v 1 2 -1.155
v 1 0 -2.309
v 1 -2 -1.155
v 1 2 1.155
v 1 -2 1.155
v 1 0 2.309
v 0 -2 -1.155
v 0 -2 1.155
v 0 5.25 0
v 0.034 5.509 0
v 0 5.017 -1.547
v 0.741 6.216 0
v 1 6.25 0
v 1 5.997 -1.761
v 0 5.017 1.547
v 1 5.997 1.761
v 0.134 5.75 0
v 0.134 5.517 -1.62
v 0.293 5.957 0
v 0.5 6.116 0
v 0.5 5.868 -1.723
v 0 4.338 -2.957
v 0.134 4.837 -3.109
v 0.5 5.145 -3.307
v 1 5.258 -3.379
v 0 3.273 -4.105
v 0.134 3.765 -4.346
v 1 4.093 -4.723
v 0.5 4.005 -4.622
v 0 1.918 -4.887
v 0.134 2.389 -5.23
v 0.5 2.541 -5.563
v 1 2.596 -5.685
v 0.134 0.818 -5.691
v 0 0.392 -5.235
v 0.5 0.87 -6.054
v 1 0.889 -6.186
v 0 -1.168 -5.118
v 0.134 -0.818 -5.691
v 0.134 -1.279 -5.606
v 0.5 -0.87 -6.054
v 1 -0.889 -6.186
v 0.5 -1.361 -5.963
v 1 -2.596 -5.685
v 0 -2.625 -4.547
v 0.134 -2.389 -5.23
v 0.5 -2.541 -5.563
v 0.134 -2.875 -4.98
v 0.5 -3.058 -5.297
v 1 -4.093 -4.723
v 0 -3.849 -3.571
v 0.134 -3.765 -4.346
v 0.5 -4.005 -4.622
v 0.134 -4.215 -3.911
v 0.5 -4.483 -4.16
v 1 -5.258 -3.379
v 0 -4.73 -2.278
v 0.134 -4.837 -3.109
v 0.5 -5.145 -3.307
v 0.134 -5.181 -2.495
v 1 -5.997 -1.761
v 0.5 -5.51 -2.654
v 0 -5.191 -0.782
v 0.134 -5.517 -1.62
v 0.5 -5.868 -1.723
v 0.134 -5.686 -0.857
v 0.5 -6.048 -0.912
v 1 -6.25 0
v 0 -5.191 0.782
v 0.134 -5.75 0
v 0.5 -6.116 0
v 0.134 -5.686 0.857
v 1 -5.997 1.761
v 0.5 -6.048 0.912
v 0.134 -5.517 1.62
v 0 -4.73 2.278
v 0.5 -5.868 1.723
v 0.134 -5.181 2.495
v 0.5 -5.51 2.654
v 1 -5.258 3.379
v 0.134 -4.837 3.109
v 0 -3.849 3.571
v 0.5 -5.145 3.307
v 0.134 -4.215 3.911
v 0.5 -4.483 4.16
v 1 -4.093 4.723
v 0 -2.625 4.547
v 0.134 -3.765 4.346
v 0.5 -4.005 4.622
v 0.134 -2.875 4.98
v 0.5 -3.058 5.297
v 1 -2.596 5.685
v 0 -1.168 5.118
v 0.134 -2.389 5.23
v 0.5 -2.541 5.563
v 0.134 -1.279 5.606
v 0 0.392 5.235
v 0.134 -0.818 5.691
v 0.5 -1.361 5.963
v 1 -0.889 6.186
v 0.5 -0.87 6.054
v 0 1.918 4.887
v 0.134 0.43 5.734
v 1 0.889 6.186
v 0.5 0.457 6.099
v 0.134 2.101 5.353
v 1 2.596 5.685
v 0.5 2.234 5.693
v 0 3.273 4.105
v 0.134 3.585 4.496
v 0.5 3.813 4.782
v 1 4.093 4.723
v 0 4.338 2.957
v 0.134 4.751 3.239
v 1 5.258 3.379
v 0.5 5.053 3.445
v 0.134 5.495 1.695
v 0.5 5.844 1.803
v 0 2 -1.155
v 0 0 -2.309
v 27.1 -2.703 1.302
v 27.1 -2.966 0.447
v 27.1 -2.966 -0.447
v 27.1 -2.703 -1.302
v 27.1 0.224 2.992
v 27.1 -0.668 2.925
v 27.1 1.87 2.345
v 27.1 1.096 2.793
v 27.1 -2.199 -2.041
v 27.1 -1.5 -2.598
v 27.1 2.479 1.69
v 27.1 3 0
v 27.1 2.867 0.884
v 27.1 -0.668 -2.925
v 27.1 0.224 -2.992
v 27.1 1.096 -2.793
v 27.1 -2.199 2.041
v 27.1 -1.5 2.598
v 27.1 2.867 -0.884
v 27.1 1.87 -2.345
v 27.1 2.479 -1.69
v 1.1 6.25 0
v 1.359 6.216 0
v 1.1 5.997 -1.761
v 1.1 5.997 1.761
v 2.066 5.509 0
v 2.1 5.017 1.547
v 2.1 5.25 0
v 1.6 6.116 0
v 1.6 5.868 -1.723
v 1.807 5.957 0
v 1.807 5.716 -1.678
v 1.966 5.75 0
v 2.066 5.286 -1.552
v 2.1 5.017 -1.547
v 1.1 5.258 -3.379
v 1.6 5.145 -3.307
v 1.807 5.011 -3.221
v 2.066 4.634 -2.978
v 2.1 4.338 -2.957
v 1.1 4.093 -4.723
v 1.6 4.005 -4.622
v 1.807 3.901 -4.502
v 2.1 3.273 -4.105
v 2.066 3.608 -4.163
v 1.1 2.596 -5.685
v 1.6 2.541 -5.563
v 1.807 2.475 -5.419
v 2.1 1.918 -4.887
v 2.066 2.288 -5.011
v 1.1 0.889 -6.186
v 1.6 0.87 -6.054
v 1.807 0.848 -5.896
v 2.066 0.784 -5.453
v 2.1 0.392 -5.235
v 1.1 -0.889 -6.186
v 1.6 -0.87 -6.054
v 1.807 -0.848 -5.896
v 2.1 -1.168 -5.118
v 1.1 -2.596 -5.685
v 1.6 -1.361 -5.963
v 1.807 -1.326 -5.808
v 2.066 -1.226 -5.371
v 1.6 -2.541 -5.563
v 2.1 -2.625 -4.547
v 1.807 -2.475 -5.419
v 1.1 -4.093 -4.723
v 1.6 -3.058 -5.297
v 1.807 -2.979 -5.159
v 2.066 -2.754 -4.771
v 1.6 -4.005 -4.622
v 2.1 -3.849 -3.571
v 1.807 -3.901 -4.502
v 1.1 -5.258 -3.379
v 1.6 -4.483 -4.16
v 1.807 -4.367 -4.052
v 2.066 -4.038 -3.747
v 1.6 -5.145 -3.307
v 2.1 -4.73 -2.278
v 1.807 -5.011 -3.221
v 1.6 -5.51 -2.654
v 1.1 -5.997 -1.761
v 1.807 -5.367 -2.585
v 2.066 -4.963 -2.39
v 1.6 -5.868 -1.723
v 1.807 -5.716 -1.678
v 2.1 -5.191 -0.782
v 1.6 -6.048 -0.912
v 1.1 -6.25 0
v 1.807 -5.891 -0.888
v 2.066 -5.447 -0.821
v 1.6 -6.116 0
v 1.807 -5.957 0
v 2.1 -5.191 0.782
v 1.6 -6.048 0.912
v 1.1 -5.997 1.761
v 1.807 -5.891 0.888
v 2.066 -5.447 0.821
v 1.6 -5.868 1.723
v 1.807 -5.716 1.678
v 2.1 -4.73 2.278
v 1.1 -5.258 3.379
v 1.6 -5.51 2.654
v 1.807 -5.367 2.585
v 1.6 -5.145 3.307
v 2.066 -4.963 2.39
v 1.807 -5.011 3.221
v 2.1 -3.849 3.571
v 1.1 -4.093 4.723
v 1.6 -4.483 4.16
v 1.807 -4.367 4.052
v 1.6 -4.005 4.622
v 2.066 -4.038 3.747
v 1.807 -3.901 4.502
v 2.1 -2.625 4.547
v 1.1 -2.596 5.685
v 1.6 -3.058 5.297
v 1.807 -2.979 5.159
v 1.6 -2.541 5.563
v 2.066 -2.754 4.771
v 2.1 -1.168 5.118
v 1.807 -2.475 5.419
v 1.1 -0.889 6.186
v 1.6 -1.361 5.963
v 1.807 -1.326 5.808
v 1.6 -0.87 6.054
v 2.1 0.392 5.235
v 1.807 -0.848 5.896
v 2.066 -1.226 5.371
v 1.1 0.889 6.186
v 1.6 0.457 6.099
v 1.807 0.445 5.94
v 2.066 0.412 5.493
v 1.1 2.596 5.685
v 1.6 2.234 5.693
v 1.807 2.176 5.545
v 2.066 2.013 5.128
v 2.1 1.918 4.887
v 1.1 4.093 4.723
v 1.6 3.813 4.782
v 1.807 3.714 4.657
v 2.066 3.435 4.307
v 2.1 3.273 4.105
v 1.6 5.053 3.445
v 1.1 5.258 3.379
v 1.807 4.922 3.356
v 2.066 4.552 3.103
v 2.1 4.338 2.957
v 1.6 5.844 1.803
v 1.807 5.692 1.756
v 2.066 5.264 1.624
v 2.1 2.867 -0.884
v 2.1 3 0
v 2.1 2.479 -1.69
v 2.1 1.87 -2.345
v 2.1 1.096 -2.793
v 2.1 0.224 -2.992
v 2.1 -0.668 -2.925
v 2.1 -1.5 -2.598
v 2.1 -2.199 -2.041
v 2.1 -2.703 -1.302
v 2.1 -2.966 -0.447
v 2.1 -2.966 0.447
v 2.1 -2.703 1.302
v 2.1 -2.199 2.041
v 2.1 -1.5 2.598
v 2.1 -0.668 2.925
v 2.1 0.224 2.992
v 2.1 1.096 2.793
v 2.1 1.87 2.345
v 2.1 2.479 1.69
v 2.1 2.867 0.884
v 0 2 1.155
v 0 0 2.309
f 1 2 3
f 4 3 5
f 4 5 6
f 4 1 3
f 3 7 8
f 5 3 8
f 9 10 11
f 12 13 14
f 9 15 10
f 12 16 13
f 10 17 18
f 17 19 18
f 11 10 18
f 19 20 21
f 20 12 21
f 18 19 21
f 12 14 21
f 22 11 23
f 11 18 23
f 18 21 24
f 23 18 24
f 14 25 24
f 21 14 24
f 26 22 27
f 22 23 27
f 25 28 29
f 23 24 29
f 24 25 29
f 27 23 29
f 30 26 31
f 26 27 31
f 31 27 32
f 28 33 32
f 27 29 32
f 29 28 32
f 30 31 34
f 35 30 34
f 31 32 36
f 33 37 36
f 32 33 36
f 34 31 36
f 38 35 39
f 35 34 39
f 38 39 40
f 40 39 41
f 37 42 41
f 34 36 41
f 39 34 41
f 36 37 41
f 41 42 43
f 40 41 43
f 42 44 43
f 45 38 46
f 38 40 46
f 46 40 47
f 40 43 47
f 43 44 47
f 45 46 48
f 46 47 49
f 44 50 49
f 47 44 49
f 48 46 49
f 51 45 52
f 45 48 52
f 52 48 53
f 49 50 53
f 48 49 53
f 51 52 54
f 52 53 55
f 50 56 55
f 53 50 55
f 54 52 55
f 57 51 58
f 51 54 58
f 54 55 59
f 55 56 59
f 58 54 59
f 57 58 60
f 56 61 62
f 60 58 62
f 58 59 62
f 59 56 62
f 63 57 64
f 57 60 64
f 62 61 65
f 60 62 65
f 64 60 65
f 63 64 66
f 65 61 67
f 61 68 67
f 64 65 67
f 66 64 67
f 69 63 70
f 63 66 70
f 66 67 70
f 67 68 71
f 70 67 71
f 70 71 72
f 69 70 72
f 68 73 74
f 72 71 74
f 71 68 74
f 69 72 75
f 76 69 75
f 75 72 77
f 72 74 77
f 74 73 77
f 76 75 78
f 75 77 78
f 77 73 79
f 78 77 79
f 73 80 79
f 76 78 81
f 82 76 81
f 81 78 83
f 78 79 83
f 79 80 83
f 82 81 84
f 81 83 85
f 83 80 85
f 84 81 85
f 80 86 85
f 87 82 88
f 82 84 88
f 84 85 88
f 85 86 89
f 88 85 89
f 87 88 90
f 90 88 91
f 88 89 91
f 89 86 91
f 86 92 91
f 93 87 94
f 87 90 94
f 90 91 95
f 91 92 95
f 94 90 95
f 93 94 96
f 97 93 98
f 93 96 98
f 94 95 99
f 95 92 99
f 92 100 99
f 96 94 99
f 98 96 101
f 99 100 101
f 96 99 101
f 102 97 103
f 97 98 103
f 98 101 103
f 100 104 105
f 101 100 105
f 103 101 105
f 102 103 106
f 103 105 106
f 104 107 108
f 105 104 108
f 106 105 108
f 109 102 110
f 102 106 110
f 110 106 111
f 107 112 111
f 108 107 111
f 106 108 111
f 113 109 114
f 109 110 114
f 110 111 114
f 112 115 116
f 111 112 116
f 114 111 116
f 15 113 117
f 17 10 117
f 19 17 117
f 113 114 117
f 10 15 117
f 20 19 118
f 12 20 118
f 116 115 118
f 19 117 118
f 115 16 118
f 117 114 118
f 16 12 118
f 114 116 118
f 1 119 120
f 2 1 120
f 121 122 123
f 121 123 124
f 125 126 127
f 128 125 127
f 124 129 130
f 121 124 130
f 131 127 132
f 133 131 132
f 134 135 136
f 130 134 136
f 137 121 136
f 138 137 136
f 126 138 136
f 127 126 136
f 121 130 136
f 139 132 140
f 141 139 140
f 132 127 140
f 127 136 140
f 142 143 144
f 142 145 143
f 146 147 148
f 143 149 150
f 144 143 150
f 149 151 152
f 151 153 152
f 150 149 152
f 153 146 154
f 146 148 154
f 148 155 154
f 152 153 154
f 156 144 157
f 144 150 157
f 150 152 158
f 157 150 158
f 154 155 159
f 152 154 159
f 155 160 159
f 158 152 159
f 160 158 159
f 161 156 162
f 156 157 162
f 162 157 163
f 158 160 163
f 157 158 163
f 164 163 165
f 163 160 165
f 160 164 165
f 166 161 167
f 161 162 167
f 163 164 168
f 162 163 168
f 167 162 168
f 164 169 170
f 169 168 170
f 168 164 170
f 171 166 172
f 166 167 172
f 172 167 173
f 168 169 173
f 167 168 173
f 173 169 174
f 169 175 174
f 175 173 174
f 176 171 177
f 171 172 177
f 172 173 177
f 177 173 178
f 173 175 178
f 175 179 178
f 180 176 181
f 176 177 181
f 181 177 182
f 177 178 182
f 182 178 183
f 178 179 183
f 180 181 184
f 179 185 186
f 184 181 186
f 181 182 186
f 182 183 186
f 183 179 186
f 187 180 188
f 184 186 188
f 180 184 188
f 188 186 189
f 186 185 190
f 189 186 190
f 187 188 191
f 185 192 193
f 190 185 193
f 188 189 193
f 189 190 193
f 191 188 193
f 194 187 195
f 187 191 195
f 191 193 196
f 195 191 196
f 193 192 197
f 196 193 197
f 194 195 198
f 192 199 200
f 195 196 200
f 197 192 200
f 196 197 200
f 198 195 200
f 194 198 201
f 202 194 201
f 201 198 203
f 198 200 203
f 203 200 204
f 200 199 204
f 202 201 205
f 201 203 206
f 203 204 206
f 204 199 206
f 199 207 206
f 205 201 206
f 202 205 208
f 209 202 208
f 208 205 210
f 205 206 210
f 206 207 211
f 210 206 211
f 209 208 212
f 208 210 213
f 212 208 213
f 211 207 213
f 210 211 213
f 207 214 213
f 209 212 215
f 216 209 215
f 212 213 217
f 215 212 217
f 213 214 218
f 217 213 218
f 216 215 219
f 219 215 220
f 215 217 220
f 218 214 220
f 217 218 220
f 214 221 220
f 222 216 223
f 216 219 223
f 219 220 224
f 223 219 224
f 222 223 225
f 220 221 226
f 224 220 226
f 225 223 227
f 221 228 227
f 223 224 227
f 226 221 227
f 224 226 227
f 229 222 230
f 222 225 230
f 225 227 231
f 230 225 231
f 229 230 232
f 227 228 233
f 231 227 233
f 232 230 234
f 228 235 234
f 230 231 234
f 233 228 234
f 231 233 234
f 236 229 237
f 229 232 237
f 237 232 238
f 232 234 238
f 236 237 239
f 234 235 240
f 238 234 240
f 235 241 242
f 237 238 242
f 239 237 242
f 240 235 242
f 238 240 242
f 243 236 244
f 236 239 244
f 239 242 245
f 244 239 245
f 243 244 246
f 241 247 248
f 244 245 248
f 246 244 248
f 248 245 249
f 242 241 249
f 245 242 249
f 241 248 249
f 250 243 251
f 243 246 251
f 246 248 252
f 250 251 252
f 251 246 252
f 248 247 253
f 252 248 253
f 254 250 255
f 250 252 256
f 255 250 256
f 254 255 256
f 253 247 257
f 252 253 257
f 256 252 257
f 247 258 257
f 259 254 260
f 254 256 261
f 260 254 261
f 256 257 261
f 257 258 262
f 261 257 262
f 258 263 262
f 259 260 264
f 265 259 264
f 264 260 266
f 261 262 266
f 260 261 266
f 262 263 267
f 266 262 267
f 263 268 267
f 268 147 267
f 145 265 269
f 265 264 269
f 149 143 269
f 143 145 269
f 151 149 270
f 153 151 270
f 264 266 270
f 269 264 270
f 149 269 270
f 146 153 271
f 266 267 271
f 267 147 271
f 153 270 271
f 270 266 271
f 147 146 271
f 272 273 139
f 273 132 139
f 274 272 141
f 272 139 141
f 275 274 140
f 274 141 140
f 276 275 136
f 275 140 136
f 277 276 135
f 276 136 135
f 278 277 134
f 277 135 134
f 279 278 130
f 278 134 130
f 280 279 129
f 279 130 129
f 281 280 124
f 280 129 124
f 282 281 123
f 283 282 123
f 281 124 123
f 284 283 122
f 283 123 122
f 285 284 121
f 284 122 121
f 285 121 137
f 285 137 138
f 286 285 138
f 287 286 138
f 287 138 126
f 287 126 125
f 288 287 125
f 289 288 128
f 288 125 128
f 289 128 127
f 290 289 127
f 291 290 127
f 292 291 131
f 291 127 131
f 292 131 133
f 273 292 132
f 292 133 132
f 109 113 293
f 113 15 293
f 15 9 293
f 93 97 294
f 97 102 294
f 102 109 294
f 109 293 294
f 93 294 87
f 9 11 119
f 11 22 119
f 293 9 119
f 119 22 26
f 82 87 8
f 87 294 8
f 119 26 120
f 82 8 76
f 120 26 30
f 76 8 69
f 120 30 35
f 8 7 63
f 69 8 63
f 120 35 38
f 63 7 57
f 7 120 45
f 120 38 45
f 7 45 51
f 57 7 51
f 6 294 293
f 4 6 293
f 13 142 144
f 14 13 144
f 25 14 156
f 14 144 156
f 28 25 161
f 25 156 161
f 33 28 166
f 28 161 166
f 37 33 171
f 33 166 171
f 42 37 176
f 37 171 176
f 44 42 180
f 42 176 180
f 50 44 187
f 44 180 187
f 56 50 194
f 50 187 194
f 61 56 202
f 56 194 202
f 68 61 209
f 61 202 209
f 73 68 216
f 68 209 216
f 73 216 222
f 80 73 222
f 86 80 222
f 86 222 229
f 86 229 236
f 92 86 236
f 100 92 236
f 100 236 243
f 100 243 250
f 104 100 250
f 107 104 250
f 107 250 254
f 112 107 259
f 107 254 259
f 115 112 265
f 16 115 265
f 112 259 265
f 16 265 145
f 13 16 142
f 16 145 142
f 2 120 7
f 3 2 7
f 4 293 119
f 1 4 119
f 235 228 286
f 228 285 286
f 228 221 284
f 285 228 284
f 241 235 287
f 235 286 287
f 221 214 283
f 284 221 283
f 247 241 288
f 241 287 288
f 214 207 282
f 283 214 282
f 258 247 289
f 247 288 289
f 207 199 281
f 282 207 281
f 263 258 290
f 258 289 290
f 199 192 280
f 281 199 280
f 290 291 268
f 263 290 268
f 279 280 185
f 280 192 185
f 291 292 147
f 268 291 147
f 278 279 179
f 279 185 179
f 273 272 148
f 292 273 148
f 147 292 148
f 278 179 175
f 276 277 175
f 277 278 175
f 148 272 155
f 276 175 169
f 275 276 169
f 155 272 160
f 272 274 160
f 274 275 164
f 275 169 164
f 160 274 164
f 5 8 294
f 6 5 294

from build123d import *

# Parameters (mm, degrees)
FILLET_1_R          = 1
CUT_EXTRUDE_1_DEPTH = 1


with BuildPart() as part:
    # 草图1 → 旋转1 (revolve)
    with BuildSketch(Plane.XY):
        Polygon((0, 0), (0, 6.25), (2.1, 6.25), (2.1, 3), (27.1, 3), (27.1, 0), align=None)
    revolve(axis=Axis((27.1, 0, 0), (-1, 0, 0)))

    # 圆角1
    fillet_1_edges = [part.edges().sort_by_distance(p)[0] for p in [
        (2.1, -6.25, 0),
        (0, -6.25, 0),
    ]]
    fillet(fillet_1_edges, radius=FILLET_1_R)

    # 草图2 → 切除-拉伸1 (cut)
    with BuildSketch(Plane.ZY):
        Polygon((1.154700538, 2), (-1.154700538, 2), (-2.309401077, 0), (-1.154700538, -2), (1.154700538, -2), (2.309401077, 0), align=None)
    extrude(amount=-CUT_EXTRUDE_1_DEPTH, mode=Mode.SUBTRACT)


solid = part.part
